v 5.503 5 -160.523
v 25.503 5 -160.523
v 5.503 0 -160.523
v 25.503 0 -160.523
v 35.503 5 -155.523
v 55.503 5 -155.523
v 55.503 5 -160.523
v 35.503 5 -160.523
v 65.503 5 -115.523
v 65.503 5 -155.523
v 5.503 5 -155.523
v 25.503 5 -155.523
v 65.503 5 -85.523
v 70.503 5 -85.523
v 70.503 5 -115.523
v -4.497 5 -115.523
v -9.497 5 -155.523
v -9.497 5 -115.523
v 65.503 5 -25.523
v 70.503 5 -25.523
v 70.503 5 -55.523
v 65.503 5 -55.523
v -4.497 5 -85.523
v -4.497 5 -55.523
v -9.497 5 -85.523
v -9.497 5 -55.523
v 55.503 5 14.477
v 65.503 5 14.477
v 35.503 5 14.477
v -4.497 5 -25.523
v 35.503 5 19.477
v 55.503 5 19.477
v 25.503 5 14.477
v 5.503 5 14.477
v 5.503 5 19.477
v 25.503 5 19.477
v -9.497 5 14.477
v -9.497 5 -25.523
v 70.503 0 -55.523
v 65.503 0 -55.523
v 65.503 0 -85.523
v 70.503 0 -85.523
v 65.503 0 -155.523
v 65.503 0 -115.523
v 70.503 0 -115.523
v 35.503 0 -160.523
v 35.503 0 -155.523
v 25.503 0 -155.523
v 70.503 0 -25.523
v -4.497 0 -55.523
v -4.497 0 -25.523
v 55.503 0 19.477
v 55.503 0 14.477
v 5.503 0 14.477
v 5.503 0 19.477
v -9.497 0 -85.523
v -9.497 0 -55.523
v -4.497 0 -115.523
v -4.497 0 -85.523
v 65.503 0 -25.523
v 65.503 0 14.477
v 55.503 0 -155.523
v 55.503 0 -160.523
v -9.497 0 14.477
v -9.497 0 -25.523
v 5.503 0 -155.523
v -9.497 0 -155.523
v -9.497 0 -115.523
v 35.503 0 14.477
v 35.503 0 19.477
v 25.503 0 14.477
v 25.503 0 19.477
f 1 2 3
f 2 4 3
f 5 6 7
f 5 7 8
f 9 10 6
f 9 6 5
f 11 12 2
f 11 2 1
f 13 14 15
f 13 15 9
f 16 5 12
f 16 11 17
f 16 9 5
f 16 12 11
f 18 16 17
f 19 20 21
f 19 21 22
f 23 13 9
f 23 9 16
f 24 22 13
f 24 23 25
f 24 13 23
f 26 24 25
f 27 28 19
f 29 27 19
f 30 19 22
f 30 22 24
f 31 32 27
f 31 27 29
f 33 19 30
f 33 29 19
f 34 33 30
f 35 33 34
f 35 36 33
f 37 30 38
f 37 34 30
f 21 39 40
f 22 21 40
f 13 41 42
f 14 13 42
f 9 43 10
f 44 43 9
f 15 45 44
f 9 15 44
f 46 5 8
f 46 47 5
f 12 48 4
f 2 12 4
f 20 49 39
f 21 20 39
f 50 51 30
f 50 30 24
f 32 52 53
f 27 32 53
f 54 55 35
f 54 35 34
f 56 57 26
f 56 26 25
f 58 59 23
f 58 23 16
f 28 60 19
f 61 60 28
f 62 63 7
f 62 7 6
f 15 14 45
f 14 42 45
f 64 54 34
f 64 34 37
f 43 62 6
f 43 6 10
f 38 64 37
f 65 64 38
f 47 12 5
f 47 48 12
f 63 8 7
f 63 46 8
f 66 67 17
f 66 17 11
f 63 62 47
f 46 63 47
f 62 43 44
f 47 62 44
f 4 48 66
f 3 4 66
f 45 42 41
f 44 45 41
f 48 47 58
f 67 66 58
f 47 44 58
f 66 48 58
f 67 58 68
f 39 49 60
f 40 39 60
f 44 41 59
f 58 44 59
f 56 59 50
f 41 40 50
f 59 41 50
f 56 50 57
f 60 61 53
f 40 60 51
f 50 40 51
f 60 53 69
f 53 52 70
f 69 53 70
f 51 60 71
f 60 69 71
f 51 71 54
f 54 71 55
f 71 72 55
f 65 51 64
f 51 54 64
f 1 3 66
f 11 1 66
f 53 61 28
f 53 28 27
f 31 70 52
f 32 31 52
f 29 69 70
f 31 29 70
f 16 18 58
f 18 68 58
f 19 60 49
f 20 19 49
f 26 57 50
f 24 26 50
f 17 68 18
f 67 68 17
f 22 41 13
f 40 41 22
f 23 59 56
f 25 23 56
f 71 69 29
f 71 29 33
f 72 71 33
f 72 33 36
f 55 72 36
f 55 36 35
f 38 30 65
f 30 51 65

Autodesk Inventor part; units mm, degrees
ref_plane "YZ Plane" through (0, 0, 0) normal (1, 0, 0) x (0, 1, 0)
ref_plane "XZ Plane" through (0, 0, 0) normal (0, 1, 0) x (-1, 0, 0)
ref_plane "XY Plane" through (0, 0, 0) normal (0, 0, 1) x (1, 0, 0)
sketch "Sketch1" plane through (0, 0, 0) normal (0, 1, 0) x (-1, 0, 0)
  line L0 (-65.5034, 14.4772) -> (4.4966, 14.4772)
  line L1 (4.4966, 14.4772) -> (4.4966, -155.5228)
  line L2 (4.4966, -155.5228) -> (-65.5034, -155.5228)
  line L3 (-65.5034, -155.5228) -> (-65.5034, 14.4772)
  line L4 (4.4966, -70.5228) -> (-65.5034, -70.5228) construction
  line L5 (-30.5034, 14.4772) -> (-30.5034, -155.5228) construction
  line L6 (4.4966, -25.5228) -> (9.4966, -25.5228)
  line L7 (9.4966, -55.5228) -> (4.4966, -55.5228)
  line L8 (4.4966, -55.5228) -> (4.4966, -25.5228)
  line L9 (4.4966, -85.5228) -> (9.4966, -85.5228)
  line L10 (9.4966, -115.5228) -> (4.4966, -115.5228)
  line L11 (4.4966, -115.5228) -> (4.4966, -85.5228)
  line L12 (-5.5034, 14.4772) -> (-25.5034, 14.4772)
  line L13 (-25.5034, 14.4772) -> (-25.5034, 19.4772)
  line L14 (-25.5034, 19.4772) -> (-5.5034, 19.4772)
  line L15 (-5.5034, 19.4772) -> (-5.5034, 14.4772)
  line L16 (-55.5034, 14.4772) -> (-35.5034, 14.4772)
  line L17 (-35.5034, 14.4772) -> (-35.5034, 19.4772)
  line L18 (-35.5034, 19.4772) -> (-55.5034, 19.4772)
  line L19 (-55.5034, 19.4772) -> (-55.5034, 14.4772)
  line L20 (-65.5034, -25.5228) -> (-70.5034, -25.5228)
  line L21 (-70.5034, -25.5228) -> (-70.5034, -55.5228)
  line L22 (-70.5034, -55.5228) -> (-65.5034, -55.5228)
  line L23 (-65.5034, -85.5228) -> (-70.5034, -85.5228)
  line L24 (-70.5034, -85.5228) -> (-70.5034, -115.5228)
  line L25 (-70.5034, -115.5228) -> (-65.5034, -115.5228)
  line L26 (-25.5034, -155.5228) -> (-25.5034, -160.5228)
  line L27 (-25.5034, -160.5228) -> (-5.5034, -160.5228)
  line L28 (-5.5034, -160.5228) -> (-5.5034, -155.5228)
  line L29 (-35.5034, -155.5228) -> (-35.5034, -160.5228)
  line L30 (-35.5034, -160.5228) -> (-55.5034, -160.5228)
  line L31 (-55.5034, -160.5228) -> (-55.5034, -155.5228)
  line L32 (4.4966, 14.4772) -> (9.4966, 14.4772)
  line L33 (9.4966, -155.5228) -> (4.4966, -155.5228)
  line L34 (4.4966, -155.5228) -> (4.4966, 14.4772)
  line L35 (9.4966, 14.4772) -> (9.4966, -25.5228)
  line L36 (9.4966, -55.5228) -> (9.4966, -85.5228)
  line L37 (9.4966, -115.5228) -> (9.4966, -155.5228)
  point P0 (0, 0)
  dimension "d0" = 170
  dimension "d1" = 70
  dimension "d2" = 5
  dimension "d3" = 30
  dimension "d4" = 5
  dimension "d5" = 30
  dimension "d6" = 30
  dimension "d7" = 15
  dimension "d8" = 20
  dimension "d9" = 20
  dimension "d10" = 5
  dimension "d11" = 5
  dimension "d12" = 10
  dimension "d13" = 5
extrude "Extrusion1" add sketch "Sketch1" along normal blind 5
properties part number "LAT 4"
